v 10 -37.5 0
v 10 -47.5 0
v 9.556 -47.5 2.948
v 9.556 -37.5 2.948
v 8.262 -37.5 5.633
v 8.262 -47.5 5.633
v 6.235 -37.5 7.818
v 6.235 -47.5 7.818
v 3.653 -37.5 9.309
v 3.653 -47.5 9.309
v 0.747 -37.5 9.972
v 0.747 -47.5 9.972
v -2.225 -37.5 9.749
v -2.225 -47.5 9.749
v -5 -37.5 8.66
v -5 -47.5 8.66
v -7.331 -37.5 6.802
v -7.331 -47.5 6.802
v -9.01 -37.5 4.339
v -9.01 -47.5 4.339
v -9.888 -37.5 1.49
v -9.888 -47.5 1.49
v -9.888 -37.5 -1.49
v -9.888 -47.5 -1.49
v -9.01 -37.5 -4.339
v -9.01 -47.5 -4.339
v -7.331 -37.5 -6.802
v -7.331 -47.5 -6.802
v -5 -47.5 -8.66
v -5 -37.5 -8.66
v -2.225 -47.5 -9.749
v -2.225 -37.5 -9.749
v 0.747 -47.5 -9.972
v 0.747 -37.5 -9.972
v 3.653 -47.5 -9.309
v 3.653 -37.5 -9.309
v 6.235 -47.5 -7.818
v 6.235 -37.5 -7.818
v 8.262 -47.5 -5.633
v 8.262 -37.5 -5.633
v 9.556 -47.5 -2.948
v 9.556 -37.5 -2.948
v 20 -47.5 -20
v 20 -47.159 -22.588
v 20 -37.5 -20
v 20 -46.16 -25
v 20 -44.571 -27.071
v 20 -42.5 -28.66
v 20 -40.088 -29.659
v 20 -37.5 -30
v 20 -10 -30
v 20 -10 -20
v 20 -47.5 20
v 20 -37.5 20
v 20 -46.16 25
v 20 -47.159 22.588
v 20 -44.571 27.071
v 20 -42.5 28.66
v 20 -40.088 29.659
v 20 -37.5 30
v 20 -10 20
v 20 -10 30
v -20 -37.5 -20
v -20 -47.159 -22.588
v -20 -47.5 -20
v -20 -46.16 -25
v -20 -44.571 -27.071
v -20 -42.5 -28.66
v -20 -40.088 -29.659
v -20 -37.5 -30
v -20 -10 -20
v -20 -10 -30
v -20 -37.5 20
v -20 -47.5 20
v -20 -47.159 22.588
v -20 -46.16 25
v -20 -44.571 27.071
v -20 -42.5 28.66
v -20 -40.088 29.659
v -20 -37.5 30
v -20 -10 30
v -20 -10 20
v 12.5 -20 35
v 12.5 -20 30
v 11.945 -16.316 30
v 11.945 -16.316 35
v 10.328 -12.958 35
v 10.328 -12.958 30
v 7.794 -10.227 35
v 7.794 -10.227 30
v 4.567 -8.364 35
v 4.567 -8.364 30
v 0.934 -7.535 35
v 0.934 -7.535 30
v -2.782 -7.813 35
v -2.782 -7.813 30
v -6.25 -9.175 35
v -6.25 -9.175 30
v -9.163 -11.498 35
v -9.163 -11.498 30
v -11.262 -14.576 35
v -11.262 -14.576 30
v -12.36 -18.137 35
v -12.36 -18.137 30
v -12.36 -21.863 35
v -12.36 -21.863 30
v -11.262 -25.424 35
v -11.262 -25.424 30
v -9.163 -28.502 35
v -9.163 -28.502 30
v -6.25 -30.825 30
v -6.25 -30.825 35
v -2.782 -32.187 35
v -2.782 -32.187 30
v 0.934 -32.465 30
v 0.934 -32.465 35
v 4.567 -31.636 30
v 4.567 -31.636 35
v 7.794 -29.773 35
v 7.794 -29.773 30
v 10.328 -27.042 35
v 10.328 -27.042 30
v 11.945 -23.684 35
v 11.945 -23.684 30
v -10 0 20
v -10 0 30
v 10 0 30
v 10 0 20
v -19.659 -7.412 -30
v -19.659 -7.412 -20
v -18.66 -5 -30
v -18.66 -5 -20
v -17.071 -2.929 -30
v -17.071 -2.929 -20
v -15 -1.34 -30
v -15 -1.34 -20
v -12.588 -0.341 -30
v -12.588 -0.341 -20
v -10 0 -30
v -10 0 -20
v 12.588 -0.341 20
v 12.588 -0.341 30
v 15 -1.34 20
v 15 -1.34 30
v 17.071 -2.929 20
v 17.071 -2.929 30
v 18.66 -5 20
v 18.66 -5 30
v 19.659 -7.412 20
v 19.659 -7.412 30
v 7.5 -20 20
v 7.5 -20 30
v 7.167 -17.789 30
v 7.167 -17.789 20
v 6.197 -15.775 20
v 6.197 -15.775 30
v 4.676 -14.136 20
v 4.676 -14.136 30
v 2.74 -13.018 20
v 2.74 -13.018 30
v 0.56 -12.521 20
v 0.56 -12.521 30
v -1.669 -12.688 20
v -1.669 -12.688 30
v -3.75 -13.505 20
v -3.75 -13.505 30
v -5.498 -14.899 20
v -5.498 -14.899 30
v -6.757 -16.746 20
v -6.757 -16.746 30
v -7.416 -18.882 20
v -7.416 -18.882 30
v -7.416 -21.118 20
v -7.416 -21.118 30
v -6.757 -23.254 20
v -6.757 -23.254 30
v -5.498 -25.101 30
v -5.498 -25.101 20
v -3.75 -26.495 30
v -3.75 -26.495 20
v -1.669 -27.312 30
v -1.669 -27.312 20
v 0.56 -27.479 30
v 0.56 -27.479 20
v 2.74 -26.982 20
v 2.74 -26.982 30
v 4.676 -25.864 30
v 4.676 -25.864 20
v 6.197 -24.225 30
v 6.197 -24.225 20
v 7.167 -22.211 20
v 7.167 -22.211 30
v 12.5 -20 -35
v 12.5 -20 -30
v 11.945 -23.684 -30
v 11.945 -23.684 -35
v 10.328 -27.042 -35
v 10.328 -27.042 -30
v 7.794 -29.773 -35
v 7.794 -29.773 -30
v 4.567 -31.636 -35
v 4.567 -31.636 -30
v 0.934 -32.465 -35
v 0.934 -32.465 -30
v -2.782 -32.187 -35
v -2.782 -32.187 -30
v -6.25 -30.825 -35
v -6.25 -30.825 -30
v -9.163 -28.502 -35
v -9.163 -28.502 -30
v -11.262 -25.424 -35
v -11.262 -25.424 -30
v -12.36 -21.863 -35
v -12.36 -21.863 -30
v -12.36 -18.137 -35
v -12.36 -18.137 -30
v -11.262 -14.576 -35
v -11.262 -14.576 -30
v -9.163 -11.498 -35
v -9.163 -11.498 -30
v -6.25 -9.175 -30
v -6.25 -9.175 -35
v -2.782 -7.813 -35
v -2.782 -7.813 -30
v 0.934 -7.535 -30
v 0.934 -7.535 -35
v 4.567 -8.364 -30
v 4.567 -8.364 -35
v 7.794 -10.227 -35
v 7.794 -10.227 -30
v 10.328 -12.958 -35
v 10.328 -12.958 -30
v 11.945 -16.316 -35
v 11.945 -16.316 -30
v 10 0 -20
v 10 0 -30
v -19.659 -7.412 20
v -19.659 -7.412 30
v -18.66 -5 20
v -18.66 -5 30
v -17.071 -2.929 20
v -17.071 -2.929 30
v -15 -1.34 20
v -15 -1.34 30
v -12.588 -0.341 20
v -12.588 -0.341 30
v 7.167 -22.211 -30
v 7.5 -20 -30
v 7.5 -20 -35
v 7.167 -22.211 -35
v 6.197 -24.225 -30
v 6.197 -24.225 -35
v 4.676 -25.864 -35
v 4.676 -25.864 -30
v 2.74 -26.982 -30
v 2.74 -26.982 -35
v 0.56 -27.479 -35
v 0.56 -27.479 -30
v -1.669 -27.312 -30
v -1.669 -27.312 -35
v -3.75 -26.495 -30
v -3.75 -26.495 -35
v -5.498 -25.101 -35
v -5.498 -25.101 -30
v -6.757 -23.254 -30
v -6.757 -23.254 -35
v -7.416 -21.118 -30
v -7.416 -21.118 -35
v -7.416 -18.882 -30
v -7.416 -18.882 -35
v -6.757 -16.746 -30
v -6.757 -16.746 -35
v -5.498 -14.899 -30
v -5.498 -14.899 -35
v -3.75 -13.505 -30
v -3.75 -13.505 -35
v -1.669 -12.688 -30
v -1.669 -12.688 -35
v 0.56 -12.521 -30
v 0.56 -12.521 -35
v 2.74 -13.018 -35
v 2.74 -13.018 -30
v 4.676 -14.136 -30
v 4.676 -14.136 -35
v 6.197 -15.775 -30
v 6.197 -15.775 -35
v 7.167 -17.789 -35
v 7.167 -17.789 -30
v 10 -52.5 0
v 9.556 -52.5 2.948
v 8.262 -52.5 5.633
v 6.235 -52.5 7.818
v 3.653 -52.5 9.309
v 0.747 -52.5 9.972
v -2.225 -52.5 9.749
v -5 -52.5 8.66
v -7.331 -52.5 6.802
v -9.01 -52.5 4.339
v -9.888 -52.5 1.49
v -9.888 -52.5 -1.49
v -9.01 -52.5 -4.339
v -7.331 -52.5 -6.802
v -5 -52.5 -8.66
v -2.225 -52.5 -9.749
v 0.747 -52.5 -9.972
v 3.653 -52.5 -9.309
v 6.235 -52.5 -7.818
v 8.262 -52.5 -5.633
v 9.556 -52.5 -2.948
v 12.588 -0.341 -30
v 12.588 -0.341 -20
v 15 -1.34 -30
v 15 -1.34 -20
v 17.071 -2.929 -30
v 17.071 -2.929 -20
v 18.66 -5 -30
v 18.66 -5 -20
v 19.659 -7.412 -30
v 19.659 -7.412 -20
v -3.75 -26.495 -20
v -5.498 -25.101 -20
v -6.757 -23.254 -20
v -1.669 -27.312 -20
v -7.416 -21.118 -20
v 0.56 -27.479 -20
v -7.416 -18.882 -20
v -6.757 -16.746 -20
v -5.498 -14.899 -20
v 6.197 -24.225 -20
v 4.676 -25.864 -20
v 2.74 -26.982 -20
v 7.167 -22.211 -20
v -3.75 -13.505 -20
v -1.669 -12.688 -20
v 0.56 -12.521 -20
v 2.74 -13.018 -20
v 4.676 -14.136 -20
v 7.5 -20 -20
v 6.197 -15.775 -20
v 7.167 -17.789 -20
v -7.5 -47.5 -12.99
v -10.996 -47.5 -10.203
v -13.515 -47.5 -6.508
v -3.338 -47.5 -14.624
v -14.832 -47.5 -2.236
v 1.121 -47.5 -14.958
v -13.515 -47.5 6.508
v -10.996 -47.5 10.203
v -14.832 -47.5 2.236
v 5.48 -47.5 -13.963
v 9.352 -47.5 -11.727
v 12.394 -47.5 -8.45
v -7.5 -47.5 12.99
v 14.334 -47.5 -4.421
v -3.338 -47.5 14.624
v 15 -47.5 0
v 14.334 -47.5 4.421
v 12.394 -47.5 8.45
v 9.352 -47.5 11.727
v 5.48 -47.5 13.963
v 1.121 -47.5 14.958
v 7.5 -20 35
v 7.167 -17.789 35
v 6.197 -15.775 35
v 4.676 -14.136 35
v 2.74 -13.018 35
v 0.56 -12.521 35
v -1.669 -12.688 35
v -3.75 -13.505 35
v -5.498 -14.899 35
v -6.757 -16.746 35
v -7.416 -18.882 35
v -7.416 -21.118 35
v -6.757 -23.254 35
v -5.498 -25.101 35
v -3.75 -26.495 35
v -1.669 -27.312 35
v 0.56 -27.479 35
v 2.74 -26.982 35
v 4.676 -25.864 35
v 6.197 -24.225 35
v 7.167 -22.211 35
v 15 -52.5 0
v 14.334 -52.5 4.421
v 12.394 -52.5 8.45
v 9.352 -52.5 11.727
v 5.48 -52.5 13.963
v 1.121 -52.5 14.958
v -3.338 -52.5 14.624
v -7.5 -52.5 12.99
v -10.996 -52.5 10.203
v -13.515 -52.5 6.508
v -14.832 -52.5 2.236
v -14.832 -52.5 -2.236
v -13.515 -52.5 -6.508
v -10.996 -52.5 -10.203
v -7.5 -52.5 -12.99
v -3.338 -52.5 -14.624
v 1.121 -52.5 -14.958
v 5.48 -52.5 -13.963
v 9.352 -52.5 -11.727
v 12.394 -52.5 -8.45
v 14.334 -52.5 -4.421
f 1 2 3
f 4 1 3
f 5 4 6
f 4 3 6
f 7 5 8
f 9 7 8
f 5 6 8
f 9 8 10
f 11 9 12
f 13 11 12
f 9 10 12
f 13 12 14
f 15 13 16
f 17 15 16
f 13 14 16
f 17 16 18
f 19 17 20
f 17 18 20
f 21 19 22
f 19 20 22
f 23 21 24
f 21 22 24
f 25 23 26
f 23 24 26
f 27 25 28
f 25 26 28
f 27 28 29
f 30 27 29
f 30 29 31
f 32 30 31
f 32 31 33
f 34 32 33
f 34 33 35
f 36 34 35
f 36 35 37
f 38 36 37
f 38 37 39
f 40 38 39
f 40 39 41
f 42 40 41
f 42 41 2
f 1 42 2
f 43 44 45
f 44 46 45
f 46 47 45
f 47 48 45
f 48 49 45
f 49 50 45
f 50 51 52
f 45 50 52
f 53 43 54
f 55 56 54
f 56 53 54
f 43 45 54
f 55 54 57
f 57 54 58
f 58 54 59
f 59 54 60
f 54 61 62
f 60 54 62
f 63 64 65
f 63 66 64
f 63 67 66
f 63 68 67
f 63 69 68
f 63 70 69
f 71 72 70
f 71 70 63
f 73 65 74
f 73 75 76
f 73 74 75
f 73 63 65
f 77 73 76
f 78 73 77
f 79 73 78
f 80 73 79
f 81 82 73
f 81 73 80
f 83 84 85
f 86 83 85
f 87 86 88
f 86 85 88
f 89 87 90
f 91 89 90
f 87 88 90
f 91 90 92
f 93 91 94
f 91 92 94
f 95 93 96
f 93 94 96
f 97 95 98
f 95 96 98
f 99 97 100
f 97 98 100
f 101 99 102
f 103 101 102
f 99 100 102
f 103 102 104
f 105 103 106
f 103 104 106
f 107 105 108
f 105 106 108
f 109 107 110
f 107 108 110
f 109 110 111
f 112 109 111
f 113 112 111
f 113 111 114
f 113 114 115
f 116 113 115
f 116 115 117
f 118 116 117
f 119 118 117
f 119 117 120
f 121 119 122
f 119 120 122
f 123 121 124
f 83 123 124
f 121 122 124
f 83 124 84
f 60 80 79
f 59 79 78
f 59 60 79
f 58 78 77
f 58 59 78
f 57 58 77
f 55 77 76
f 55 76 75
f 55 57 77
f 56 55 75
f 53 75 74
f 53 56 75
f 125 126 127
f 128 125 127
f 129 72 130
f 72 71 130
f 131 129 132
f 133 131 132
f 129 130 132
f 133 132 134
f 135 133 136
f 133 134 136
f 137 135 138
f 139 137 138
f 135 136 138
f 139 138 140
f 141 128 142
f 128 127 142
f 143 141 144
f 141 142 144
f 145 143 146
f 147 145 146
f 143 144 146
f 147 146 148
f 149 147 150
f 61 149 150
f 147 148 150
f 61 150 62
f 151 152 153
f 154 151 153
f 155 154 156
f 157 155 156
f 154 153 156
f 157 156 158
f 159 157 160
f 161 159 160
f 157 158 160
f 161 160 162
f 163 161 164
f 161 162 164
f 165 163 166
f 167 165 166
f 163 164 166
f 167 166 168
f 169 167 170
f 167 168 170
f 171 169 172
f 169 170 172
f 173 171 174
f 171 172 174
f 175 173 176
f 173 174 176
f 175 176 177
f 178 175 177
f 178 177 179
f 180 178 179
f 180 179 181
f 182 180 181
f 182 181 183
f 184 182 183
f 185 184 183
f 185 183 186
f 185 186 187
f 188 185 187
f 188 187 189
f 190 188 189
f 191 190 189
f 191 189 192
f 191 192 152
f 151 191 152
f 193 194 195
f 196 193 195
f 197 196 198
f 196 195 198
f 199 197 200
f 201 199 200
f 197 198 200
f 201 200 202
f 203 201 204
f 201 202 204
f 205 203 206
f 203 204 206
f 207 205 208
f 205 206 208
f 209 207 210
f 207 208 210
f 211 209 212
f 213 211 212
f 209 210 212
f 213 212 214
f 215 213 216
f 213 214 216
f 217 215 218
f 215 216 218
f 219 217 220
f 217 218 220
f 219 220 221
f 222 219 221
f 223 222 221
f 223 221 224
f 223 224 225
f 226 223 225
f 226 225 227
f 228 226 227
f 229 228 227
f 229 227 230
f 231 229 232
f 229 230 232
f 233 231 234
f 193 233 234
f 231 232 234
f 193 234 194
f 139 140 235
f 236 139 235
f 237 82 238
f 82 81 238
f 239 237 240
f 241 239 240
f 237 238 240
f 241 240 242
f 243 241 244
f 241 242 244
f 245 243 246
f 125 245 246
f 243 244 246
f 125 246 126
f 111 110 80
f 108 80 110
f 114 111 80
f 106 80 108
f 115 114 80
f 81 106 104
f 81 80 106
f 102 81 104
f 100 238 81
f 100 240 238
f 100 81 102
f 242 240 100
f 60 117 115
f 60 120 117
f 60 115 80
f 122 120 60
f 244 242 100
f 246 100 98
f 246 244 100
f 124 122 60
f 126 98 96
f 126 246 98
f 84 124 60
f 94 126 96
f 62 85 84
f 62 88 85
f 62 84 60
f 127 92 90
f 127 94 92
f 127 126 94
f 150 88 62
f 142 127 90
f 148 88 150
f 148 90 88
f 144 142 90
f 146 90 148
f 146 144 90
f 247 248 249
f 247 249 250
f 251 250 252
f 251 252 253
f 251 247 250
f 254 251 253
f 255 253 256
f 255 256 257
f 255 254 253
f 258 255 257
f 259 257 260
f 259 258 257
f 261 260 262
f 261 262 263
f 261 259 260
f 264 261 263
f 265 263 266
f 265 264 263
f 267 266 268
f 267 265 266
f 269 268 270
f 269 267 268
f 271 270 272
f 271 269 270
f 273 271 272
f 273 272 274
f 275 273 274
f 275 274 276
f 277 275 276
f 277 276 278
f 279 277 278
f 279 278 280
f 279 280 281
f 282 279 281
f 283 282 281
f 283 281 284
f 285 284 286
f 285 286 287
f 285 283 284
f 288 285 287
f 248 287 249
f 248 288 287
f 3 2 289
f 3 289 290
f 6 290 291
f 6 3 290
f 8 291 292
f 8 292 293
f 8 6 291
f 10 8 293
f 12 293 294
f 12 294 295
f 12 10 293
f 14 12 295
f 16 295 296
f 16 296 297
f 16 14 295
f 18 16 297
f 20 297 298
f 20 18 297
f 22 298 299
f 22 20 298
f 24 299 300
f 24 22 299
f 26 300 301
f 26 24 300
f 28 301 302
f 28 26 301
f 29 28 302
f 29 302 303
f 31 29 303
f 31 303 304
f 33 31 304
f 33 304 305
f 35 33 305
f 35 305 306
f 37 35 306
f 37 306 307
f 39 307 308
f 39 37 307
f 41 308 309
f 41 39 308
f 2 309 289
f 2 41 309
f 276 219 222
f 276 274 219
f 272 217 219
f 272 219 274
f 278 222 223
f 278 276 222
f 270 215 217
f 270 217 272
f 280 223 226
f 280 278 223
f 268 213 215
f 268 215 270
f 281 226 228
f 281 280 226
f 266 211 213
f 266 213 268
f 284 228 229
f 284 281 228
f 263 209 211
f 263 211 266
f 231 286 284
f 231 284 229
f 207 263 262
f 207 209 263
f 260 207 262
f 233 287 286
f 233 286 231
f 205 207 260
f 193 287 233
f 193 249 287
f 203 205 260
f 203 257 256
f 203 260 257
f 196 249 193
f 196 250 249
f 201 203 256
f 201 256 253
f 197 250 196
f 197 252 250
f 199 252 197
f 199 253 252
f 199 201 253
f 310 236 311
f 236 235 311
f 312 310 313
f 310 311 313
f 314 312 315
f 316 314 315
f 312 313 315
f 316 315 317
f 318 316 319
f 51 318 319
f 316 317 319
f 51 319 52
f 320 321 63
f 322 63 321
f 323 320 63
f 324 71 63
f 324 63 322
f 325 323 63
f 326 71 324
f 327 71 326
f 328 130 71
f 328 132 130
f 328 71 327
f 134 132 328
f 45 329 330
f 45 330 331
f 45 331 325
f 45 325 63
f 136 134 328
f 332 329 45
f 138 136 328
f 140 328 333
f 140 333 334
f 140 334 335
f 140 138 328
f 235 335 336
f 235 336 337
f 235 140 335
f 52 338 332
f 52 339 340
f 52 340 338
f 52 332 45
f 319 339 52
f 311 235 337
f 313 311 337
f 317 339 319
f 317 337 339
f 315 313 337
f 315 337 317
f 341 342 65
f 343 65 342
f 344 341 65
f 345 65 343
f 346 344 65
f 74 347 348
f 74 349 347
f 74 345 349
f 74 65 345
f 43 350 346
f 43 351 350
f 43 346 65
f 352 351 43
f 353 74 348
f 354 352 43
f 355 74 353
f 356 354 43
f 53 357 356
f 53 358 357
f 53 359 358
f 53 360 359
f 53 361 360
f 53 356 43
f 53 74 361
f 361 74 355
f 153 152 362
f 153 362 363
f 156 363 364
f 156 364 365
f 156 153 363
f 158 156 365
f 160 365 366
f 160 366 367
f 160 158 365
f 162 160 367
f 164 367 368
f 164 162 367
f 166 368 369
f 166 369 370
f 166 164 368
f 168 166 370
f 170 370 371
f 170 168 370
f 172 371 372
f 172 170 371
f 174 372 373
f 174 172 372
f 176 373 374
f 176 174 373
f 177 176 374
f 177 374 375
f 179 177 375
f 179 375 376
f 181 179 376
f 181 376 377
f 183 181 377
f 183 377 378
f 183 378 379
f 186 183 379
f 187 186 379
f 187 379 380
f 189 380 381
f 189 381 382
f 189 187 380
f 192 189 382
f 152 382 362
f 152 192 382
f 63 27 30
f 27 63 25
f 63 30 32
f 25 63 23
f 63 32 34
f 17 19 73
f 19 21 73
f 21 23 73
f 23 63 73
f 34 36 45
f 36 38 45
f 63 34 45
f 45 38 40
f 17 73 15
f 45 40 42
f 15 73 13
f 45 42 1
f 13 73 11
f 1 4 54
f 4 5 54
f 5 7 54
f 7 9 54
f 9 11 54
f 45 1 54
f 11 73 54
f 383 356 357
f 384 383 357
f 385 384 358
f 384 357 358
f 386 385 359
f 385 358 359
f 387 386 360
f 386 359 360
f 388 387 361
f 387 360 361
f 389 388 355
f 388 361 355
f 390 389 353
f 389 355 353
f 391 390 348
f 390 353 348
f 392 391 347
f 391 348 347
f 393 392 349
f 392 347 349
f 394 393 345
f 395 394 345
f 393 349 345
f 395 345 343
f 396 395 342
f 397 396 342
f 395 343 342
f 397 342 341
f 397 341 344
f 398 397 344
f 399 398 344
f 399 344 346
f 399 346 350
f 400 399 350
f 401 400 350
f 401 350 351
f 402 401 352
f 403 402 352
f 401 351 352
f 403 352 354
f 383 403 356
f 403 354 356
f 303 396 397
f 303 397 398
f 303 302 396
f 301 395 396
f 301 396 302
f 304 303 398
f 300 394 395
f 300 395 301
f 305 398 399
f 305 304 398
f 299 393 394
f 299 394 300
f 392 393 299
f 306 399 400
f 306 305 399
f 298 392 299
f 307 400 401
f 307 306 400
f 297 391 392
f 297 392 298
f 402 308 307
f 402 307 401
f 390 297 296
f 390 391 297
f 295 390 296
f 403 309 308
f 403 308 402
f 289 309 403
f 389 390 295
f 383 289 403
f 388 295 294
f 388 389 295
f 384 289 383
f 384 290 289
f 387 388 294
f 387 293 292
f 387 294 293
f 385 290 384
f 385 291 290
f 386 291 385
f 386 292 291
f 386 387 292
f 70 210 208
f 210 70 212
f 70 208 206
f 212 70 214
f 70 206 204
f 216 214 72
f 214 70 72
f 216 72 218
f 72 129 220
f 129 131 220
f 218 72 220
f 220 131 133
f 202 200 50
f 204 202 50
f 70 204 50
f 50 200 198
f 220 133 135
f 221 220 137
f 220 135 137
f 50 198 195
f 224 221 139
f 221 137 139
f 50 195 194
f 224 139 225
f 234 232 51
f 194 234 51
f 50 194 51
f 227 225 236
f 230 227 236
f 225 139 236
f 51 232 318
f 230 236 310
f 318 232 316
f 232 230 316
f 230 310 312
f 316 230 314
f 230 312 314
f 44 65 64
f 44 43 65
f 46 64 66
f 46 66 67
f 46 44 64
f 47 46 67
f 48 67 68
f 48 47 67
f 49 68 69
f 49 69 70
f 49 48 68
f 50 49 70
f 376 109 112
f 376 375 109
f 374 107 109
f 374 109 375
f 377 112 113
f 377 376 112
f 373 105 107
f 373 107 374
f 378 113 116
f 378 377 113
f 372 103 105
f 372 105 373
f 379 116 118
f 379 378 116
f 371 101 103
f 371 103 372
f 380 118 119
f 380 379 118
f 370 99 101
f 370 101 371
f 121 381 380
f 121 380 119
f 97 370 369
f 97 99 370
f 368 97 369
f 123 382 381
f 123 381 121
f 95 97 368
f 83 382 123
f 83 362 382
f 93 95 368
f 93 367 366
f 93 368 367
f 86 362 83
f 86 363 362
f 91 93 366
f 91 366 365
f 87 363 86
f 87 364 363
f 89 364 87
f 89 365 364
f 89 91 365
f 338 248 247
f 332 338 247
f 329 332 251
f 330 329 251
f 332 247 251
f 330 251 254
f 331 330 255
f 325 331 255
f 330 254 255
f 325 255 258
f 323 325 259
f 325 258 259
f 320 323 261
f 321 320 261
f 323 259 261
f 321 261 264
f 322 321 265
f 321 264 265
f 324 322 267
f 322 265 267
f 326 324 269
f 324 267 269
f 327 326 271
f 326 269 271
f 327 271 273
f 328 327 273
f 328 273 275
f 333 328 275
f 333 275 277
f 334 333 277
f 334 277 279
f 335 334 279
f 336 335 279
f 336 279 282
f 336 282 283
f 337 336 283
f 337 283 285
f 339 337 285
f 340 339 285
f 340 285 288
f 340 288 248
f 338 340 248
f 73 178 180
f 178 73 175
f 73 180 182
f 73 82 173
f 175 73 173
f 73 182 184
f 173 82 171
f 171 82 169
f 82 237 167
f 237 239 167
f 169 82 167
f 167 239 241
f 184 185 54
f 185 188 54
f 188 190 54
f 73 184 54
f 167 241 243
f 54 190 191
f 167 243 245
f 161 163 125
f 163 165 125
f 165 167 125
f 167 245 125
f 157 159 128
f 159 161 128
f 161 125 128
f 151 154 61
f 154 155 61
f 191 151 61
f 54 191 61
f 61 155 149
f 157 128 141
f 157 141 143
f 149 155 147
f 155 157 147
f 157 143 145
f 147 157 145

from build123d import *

# Parameters (mm, degrees)
F9_W       = 40
F9_H       = 60
F0_DEPTH   = 47.5
F10_W      = 81.115219
F10_H      = 40
F1_DEPTH   = 37.5
F3_R       = 12.5
F3_R_2     = 7.5
F4_DEPTH   = 5
F2_R       = 12.5
F2_R_2     = 7.5
F11_DEPTH  = 5
F5_R       = 10
F12_R      = 15
F12_R_2    = 10
F13_DEPTH  = 5
F6_DEPTH   = 25
F4_FACE_R  = 7.5
F7_DEPTH   = 25
F13_FACE_R = 10
F8_DEPTH   = 25


with BuildPart() as f0:
    # F9 (on Front) → F0 (new body)
    with BuildSketch(Plane.XZ):
        Rectangle(F9_W, F9_H)
    extrude(amount=F0_DEPTH)

    # F10 (on Front) → F1 (cut)
    with BuildSketch(Plane.XZ):
        with Locations((-0.543405, 0)):
            Rectangle(F10_W, F10_H)
    extrude(amount=F1_DEPTH, mode=Mode.SUBTRACT)

    # F3 (on face) → F4 (join)
    with BuildSketch(Plane(origin=(0, 0, -30), x_dir=(1, 0, 0), z_dir=(0, 0, -1))):
        with Locations((0, 20)):
            Circle(F3_R)
        with Locations((0, 20)):
            Circle(F3_R_2, mode=Mode.SUBTRACT)
    extrude(amount=F4_DEPTH)

    # F2 (on face) → F11 (join)
    with BuildSketch(Plane.XY.offset(30)):
        with Locations((0, -20)):
            Circle(F2_R)
        with Locations((0, -20)):
            Circle(F2_R_2, mode=Mode.SUBTRACT)
    extrude(amount=F11_DEPTH)

    # F5
    f5_edges = [f0.edges().sort_by_distance(p)[0] for p in [
        (0, -47.5, -30),
        (0, -47.5, 30),
        (20, 0, -25),
        (20, 0, 25),
        (-20, 0, 25),
        (-20, 0, -25),
    ]]
    fillet(f5_edges, radius=F5_R)

    # F12 (on face) → F13 (join)
    with BuildSketch(Plane.XZ.offset(47.5)):
        Circle(F12_R)
        Circle(F12_R_2, mode=Mode.SUBTRACT)
    extrude(amount=F13_DEPTH)

    # F2 (on face) → F6 (cut)
    with BuildSketch(Plane.XY.offset(30)):
        with Locations((0, -20)):
            Circle(F2_R_2)
    extrude(amount=-F6_DEPTH, mode=Mode.SUBTRACT)

    # F4_face (on face) → F7 (cut)
    with BuildSketch(Plane(origin=(0, -20, -30), x_dir=(1, 0, 0), z_dir=(0, 0, -1))):
        Circle(F4_FACE_R)
    extrude(amount=-F7_DEPTH, mode=Mode.SUBTRACT)

    # F13_face (on face) → F8 (cut)
    with BuildSketch(Plane.XZ.offset(47.5)):
        Circle(F13_FACE_R)
    extrude(amount=-F8_DEPTH, mode=Mode.SUBTRACT)


solid = f0.part
